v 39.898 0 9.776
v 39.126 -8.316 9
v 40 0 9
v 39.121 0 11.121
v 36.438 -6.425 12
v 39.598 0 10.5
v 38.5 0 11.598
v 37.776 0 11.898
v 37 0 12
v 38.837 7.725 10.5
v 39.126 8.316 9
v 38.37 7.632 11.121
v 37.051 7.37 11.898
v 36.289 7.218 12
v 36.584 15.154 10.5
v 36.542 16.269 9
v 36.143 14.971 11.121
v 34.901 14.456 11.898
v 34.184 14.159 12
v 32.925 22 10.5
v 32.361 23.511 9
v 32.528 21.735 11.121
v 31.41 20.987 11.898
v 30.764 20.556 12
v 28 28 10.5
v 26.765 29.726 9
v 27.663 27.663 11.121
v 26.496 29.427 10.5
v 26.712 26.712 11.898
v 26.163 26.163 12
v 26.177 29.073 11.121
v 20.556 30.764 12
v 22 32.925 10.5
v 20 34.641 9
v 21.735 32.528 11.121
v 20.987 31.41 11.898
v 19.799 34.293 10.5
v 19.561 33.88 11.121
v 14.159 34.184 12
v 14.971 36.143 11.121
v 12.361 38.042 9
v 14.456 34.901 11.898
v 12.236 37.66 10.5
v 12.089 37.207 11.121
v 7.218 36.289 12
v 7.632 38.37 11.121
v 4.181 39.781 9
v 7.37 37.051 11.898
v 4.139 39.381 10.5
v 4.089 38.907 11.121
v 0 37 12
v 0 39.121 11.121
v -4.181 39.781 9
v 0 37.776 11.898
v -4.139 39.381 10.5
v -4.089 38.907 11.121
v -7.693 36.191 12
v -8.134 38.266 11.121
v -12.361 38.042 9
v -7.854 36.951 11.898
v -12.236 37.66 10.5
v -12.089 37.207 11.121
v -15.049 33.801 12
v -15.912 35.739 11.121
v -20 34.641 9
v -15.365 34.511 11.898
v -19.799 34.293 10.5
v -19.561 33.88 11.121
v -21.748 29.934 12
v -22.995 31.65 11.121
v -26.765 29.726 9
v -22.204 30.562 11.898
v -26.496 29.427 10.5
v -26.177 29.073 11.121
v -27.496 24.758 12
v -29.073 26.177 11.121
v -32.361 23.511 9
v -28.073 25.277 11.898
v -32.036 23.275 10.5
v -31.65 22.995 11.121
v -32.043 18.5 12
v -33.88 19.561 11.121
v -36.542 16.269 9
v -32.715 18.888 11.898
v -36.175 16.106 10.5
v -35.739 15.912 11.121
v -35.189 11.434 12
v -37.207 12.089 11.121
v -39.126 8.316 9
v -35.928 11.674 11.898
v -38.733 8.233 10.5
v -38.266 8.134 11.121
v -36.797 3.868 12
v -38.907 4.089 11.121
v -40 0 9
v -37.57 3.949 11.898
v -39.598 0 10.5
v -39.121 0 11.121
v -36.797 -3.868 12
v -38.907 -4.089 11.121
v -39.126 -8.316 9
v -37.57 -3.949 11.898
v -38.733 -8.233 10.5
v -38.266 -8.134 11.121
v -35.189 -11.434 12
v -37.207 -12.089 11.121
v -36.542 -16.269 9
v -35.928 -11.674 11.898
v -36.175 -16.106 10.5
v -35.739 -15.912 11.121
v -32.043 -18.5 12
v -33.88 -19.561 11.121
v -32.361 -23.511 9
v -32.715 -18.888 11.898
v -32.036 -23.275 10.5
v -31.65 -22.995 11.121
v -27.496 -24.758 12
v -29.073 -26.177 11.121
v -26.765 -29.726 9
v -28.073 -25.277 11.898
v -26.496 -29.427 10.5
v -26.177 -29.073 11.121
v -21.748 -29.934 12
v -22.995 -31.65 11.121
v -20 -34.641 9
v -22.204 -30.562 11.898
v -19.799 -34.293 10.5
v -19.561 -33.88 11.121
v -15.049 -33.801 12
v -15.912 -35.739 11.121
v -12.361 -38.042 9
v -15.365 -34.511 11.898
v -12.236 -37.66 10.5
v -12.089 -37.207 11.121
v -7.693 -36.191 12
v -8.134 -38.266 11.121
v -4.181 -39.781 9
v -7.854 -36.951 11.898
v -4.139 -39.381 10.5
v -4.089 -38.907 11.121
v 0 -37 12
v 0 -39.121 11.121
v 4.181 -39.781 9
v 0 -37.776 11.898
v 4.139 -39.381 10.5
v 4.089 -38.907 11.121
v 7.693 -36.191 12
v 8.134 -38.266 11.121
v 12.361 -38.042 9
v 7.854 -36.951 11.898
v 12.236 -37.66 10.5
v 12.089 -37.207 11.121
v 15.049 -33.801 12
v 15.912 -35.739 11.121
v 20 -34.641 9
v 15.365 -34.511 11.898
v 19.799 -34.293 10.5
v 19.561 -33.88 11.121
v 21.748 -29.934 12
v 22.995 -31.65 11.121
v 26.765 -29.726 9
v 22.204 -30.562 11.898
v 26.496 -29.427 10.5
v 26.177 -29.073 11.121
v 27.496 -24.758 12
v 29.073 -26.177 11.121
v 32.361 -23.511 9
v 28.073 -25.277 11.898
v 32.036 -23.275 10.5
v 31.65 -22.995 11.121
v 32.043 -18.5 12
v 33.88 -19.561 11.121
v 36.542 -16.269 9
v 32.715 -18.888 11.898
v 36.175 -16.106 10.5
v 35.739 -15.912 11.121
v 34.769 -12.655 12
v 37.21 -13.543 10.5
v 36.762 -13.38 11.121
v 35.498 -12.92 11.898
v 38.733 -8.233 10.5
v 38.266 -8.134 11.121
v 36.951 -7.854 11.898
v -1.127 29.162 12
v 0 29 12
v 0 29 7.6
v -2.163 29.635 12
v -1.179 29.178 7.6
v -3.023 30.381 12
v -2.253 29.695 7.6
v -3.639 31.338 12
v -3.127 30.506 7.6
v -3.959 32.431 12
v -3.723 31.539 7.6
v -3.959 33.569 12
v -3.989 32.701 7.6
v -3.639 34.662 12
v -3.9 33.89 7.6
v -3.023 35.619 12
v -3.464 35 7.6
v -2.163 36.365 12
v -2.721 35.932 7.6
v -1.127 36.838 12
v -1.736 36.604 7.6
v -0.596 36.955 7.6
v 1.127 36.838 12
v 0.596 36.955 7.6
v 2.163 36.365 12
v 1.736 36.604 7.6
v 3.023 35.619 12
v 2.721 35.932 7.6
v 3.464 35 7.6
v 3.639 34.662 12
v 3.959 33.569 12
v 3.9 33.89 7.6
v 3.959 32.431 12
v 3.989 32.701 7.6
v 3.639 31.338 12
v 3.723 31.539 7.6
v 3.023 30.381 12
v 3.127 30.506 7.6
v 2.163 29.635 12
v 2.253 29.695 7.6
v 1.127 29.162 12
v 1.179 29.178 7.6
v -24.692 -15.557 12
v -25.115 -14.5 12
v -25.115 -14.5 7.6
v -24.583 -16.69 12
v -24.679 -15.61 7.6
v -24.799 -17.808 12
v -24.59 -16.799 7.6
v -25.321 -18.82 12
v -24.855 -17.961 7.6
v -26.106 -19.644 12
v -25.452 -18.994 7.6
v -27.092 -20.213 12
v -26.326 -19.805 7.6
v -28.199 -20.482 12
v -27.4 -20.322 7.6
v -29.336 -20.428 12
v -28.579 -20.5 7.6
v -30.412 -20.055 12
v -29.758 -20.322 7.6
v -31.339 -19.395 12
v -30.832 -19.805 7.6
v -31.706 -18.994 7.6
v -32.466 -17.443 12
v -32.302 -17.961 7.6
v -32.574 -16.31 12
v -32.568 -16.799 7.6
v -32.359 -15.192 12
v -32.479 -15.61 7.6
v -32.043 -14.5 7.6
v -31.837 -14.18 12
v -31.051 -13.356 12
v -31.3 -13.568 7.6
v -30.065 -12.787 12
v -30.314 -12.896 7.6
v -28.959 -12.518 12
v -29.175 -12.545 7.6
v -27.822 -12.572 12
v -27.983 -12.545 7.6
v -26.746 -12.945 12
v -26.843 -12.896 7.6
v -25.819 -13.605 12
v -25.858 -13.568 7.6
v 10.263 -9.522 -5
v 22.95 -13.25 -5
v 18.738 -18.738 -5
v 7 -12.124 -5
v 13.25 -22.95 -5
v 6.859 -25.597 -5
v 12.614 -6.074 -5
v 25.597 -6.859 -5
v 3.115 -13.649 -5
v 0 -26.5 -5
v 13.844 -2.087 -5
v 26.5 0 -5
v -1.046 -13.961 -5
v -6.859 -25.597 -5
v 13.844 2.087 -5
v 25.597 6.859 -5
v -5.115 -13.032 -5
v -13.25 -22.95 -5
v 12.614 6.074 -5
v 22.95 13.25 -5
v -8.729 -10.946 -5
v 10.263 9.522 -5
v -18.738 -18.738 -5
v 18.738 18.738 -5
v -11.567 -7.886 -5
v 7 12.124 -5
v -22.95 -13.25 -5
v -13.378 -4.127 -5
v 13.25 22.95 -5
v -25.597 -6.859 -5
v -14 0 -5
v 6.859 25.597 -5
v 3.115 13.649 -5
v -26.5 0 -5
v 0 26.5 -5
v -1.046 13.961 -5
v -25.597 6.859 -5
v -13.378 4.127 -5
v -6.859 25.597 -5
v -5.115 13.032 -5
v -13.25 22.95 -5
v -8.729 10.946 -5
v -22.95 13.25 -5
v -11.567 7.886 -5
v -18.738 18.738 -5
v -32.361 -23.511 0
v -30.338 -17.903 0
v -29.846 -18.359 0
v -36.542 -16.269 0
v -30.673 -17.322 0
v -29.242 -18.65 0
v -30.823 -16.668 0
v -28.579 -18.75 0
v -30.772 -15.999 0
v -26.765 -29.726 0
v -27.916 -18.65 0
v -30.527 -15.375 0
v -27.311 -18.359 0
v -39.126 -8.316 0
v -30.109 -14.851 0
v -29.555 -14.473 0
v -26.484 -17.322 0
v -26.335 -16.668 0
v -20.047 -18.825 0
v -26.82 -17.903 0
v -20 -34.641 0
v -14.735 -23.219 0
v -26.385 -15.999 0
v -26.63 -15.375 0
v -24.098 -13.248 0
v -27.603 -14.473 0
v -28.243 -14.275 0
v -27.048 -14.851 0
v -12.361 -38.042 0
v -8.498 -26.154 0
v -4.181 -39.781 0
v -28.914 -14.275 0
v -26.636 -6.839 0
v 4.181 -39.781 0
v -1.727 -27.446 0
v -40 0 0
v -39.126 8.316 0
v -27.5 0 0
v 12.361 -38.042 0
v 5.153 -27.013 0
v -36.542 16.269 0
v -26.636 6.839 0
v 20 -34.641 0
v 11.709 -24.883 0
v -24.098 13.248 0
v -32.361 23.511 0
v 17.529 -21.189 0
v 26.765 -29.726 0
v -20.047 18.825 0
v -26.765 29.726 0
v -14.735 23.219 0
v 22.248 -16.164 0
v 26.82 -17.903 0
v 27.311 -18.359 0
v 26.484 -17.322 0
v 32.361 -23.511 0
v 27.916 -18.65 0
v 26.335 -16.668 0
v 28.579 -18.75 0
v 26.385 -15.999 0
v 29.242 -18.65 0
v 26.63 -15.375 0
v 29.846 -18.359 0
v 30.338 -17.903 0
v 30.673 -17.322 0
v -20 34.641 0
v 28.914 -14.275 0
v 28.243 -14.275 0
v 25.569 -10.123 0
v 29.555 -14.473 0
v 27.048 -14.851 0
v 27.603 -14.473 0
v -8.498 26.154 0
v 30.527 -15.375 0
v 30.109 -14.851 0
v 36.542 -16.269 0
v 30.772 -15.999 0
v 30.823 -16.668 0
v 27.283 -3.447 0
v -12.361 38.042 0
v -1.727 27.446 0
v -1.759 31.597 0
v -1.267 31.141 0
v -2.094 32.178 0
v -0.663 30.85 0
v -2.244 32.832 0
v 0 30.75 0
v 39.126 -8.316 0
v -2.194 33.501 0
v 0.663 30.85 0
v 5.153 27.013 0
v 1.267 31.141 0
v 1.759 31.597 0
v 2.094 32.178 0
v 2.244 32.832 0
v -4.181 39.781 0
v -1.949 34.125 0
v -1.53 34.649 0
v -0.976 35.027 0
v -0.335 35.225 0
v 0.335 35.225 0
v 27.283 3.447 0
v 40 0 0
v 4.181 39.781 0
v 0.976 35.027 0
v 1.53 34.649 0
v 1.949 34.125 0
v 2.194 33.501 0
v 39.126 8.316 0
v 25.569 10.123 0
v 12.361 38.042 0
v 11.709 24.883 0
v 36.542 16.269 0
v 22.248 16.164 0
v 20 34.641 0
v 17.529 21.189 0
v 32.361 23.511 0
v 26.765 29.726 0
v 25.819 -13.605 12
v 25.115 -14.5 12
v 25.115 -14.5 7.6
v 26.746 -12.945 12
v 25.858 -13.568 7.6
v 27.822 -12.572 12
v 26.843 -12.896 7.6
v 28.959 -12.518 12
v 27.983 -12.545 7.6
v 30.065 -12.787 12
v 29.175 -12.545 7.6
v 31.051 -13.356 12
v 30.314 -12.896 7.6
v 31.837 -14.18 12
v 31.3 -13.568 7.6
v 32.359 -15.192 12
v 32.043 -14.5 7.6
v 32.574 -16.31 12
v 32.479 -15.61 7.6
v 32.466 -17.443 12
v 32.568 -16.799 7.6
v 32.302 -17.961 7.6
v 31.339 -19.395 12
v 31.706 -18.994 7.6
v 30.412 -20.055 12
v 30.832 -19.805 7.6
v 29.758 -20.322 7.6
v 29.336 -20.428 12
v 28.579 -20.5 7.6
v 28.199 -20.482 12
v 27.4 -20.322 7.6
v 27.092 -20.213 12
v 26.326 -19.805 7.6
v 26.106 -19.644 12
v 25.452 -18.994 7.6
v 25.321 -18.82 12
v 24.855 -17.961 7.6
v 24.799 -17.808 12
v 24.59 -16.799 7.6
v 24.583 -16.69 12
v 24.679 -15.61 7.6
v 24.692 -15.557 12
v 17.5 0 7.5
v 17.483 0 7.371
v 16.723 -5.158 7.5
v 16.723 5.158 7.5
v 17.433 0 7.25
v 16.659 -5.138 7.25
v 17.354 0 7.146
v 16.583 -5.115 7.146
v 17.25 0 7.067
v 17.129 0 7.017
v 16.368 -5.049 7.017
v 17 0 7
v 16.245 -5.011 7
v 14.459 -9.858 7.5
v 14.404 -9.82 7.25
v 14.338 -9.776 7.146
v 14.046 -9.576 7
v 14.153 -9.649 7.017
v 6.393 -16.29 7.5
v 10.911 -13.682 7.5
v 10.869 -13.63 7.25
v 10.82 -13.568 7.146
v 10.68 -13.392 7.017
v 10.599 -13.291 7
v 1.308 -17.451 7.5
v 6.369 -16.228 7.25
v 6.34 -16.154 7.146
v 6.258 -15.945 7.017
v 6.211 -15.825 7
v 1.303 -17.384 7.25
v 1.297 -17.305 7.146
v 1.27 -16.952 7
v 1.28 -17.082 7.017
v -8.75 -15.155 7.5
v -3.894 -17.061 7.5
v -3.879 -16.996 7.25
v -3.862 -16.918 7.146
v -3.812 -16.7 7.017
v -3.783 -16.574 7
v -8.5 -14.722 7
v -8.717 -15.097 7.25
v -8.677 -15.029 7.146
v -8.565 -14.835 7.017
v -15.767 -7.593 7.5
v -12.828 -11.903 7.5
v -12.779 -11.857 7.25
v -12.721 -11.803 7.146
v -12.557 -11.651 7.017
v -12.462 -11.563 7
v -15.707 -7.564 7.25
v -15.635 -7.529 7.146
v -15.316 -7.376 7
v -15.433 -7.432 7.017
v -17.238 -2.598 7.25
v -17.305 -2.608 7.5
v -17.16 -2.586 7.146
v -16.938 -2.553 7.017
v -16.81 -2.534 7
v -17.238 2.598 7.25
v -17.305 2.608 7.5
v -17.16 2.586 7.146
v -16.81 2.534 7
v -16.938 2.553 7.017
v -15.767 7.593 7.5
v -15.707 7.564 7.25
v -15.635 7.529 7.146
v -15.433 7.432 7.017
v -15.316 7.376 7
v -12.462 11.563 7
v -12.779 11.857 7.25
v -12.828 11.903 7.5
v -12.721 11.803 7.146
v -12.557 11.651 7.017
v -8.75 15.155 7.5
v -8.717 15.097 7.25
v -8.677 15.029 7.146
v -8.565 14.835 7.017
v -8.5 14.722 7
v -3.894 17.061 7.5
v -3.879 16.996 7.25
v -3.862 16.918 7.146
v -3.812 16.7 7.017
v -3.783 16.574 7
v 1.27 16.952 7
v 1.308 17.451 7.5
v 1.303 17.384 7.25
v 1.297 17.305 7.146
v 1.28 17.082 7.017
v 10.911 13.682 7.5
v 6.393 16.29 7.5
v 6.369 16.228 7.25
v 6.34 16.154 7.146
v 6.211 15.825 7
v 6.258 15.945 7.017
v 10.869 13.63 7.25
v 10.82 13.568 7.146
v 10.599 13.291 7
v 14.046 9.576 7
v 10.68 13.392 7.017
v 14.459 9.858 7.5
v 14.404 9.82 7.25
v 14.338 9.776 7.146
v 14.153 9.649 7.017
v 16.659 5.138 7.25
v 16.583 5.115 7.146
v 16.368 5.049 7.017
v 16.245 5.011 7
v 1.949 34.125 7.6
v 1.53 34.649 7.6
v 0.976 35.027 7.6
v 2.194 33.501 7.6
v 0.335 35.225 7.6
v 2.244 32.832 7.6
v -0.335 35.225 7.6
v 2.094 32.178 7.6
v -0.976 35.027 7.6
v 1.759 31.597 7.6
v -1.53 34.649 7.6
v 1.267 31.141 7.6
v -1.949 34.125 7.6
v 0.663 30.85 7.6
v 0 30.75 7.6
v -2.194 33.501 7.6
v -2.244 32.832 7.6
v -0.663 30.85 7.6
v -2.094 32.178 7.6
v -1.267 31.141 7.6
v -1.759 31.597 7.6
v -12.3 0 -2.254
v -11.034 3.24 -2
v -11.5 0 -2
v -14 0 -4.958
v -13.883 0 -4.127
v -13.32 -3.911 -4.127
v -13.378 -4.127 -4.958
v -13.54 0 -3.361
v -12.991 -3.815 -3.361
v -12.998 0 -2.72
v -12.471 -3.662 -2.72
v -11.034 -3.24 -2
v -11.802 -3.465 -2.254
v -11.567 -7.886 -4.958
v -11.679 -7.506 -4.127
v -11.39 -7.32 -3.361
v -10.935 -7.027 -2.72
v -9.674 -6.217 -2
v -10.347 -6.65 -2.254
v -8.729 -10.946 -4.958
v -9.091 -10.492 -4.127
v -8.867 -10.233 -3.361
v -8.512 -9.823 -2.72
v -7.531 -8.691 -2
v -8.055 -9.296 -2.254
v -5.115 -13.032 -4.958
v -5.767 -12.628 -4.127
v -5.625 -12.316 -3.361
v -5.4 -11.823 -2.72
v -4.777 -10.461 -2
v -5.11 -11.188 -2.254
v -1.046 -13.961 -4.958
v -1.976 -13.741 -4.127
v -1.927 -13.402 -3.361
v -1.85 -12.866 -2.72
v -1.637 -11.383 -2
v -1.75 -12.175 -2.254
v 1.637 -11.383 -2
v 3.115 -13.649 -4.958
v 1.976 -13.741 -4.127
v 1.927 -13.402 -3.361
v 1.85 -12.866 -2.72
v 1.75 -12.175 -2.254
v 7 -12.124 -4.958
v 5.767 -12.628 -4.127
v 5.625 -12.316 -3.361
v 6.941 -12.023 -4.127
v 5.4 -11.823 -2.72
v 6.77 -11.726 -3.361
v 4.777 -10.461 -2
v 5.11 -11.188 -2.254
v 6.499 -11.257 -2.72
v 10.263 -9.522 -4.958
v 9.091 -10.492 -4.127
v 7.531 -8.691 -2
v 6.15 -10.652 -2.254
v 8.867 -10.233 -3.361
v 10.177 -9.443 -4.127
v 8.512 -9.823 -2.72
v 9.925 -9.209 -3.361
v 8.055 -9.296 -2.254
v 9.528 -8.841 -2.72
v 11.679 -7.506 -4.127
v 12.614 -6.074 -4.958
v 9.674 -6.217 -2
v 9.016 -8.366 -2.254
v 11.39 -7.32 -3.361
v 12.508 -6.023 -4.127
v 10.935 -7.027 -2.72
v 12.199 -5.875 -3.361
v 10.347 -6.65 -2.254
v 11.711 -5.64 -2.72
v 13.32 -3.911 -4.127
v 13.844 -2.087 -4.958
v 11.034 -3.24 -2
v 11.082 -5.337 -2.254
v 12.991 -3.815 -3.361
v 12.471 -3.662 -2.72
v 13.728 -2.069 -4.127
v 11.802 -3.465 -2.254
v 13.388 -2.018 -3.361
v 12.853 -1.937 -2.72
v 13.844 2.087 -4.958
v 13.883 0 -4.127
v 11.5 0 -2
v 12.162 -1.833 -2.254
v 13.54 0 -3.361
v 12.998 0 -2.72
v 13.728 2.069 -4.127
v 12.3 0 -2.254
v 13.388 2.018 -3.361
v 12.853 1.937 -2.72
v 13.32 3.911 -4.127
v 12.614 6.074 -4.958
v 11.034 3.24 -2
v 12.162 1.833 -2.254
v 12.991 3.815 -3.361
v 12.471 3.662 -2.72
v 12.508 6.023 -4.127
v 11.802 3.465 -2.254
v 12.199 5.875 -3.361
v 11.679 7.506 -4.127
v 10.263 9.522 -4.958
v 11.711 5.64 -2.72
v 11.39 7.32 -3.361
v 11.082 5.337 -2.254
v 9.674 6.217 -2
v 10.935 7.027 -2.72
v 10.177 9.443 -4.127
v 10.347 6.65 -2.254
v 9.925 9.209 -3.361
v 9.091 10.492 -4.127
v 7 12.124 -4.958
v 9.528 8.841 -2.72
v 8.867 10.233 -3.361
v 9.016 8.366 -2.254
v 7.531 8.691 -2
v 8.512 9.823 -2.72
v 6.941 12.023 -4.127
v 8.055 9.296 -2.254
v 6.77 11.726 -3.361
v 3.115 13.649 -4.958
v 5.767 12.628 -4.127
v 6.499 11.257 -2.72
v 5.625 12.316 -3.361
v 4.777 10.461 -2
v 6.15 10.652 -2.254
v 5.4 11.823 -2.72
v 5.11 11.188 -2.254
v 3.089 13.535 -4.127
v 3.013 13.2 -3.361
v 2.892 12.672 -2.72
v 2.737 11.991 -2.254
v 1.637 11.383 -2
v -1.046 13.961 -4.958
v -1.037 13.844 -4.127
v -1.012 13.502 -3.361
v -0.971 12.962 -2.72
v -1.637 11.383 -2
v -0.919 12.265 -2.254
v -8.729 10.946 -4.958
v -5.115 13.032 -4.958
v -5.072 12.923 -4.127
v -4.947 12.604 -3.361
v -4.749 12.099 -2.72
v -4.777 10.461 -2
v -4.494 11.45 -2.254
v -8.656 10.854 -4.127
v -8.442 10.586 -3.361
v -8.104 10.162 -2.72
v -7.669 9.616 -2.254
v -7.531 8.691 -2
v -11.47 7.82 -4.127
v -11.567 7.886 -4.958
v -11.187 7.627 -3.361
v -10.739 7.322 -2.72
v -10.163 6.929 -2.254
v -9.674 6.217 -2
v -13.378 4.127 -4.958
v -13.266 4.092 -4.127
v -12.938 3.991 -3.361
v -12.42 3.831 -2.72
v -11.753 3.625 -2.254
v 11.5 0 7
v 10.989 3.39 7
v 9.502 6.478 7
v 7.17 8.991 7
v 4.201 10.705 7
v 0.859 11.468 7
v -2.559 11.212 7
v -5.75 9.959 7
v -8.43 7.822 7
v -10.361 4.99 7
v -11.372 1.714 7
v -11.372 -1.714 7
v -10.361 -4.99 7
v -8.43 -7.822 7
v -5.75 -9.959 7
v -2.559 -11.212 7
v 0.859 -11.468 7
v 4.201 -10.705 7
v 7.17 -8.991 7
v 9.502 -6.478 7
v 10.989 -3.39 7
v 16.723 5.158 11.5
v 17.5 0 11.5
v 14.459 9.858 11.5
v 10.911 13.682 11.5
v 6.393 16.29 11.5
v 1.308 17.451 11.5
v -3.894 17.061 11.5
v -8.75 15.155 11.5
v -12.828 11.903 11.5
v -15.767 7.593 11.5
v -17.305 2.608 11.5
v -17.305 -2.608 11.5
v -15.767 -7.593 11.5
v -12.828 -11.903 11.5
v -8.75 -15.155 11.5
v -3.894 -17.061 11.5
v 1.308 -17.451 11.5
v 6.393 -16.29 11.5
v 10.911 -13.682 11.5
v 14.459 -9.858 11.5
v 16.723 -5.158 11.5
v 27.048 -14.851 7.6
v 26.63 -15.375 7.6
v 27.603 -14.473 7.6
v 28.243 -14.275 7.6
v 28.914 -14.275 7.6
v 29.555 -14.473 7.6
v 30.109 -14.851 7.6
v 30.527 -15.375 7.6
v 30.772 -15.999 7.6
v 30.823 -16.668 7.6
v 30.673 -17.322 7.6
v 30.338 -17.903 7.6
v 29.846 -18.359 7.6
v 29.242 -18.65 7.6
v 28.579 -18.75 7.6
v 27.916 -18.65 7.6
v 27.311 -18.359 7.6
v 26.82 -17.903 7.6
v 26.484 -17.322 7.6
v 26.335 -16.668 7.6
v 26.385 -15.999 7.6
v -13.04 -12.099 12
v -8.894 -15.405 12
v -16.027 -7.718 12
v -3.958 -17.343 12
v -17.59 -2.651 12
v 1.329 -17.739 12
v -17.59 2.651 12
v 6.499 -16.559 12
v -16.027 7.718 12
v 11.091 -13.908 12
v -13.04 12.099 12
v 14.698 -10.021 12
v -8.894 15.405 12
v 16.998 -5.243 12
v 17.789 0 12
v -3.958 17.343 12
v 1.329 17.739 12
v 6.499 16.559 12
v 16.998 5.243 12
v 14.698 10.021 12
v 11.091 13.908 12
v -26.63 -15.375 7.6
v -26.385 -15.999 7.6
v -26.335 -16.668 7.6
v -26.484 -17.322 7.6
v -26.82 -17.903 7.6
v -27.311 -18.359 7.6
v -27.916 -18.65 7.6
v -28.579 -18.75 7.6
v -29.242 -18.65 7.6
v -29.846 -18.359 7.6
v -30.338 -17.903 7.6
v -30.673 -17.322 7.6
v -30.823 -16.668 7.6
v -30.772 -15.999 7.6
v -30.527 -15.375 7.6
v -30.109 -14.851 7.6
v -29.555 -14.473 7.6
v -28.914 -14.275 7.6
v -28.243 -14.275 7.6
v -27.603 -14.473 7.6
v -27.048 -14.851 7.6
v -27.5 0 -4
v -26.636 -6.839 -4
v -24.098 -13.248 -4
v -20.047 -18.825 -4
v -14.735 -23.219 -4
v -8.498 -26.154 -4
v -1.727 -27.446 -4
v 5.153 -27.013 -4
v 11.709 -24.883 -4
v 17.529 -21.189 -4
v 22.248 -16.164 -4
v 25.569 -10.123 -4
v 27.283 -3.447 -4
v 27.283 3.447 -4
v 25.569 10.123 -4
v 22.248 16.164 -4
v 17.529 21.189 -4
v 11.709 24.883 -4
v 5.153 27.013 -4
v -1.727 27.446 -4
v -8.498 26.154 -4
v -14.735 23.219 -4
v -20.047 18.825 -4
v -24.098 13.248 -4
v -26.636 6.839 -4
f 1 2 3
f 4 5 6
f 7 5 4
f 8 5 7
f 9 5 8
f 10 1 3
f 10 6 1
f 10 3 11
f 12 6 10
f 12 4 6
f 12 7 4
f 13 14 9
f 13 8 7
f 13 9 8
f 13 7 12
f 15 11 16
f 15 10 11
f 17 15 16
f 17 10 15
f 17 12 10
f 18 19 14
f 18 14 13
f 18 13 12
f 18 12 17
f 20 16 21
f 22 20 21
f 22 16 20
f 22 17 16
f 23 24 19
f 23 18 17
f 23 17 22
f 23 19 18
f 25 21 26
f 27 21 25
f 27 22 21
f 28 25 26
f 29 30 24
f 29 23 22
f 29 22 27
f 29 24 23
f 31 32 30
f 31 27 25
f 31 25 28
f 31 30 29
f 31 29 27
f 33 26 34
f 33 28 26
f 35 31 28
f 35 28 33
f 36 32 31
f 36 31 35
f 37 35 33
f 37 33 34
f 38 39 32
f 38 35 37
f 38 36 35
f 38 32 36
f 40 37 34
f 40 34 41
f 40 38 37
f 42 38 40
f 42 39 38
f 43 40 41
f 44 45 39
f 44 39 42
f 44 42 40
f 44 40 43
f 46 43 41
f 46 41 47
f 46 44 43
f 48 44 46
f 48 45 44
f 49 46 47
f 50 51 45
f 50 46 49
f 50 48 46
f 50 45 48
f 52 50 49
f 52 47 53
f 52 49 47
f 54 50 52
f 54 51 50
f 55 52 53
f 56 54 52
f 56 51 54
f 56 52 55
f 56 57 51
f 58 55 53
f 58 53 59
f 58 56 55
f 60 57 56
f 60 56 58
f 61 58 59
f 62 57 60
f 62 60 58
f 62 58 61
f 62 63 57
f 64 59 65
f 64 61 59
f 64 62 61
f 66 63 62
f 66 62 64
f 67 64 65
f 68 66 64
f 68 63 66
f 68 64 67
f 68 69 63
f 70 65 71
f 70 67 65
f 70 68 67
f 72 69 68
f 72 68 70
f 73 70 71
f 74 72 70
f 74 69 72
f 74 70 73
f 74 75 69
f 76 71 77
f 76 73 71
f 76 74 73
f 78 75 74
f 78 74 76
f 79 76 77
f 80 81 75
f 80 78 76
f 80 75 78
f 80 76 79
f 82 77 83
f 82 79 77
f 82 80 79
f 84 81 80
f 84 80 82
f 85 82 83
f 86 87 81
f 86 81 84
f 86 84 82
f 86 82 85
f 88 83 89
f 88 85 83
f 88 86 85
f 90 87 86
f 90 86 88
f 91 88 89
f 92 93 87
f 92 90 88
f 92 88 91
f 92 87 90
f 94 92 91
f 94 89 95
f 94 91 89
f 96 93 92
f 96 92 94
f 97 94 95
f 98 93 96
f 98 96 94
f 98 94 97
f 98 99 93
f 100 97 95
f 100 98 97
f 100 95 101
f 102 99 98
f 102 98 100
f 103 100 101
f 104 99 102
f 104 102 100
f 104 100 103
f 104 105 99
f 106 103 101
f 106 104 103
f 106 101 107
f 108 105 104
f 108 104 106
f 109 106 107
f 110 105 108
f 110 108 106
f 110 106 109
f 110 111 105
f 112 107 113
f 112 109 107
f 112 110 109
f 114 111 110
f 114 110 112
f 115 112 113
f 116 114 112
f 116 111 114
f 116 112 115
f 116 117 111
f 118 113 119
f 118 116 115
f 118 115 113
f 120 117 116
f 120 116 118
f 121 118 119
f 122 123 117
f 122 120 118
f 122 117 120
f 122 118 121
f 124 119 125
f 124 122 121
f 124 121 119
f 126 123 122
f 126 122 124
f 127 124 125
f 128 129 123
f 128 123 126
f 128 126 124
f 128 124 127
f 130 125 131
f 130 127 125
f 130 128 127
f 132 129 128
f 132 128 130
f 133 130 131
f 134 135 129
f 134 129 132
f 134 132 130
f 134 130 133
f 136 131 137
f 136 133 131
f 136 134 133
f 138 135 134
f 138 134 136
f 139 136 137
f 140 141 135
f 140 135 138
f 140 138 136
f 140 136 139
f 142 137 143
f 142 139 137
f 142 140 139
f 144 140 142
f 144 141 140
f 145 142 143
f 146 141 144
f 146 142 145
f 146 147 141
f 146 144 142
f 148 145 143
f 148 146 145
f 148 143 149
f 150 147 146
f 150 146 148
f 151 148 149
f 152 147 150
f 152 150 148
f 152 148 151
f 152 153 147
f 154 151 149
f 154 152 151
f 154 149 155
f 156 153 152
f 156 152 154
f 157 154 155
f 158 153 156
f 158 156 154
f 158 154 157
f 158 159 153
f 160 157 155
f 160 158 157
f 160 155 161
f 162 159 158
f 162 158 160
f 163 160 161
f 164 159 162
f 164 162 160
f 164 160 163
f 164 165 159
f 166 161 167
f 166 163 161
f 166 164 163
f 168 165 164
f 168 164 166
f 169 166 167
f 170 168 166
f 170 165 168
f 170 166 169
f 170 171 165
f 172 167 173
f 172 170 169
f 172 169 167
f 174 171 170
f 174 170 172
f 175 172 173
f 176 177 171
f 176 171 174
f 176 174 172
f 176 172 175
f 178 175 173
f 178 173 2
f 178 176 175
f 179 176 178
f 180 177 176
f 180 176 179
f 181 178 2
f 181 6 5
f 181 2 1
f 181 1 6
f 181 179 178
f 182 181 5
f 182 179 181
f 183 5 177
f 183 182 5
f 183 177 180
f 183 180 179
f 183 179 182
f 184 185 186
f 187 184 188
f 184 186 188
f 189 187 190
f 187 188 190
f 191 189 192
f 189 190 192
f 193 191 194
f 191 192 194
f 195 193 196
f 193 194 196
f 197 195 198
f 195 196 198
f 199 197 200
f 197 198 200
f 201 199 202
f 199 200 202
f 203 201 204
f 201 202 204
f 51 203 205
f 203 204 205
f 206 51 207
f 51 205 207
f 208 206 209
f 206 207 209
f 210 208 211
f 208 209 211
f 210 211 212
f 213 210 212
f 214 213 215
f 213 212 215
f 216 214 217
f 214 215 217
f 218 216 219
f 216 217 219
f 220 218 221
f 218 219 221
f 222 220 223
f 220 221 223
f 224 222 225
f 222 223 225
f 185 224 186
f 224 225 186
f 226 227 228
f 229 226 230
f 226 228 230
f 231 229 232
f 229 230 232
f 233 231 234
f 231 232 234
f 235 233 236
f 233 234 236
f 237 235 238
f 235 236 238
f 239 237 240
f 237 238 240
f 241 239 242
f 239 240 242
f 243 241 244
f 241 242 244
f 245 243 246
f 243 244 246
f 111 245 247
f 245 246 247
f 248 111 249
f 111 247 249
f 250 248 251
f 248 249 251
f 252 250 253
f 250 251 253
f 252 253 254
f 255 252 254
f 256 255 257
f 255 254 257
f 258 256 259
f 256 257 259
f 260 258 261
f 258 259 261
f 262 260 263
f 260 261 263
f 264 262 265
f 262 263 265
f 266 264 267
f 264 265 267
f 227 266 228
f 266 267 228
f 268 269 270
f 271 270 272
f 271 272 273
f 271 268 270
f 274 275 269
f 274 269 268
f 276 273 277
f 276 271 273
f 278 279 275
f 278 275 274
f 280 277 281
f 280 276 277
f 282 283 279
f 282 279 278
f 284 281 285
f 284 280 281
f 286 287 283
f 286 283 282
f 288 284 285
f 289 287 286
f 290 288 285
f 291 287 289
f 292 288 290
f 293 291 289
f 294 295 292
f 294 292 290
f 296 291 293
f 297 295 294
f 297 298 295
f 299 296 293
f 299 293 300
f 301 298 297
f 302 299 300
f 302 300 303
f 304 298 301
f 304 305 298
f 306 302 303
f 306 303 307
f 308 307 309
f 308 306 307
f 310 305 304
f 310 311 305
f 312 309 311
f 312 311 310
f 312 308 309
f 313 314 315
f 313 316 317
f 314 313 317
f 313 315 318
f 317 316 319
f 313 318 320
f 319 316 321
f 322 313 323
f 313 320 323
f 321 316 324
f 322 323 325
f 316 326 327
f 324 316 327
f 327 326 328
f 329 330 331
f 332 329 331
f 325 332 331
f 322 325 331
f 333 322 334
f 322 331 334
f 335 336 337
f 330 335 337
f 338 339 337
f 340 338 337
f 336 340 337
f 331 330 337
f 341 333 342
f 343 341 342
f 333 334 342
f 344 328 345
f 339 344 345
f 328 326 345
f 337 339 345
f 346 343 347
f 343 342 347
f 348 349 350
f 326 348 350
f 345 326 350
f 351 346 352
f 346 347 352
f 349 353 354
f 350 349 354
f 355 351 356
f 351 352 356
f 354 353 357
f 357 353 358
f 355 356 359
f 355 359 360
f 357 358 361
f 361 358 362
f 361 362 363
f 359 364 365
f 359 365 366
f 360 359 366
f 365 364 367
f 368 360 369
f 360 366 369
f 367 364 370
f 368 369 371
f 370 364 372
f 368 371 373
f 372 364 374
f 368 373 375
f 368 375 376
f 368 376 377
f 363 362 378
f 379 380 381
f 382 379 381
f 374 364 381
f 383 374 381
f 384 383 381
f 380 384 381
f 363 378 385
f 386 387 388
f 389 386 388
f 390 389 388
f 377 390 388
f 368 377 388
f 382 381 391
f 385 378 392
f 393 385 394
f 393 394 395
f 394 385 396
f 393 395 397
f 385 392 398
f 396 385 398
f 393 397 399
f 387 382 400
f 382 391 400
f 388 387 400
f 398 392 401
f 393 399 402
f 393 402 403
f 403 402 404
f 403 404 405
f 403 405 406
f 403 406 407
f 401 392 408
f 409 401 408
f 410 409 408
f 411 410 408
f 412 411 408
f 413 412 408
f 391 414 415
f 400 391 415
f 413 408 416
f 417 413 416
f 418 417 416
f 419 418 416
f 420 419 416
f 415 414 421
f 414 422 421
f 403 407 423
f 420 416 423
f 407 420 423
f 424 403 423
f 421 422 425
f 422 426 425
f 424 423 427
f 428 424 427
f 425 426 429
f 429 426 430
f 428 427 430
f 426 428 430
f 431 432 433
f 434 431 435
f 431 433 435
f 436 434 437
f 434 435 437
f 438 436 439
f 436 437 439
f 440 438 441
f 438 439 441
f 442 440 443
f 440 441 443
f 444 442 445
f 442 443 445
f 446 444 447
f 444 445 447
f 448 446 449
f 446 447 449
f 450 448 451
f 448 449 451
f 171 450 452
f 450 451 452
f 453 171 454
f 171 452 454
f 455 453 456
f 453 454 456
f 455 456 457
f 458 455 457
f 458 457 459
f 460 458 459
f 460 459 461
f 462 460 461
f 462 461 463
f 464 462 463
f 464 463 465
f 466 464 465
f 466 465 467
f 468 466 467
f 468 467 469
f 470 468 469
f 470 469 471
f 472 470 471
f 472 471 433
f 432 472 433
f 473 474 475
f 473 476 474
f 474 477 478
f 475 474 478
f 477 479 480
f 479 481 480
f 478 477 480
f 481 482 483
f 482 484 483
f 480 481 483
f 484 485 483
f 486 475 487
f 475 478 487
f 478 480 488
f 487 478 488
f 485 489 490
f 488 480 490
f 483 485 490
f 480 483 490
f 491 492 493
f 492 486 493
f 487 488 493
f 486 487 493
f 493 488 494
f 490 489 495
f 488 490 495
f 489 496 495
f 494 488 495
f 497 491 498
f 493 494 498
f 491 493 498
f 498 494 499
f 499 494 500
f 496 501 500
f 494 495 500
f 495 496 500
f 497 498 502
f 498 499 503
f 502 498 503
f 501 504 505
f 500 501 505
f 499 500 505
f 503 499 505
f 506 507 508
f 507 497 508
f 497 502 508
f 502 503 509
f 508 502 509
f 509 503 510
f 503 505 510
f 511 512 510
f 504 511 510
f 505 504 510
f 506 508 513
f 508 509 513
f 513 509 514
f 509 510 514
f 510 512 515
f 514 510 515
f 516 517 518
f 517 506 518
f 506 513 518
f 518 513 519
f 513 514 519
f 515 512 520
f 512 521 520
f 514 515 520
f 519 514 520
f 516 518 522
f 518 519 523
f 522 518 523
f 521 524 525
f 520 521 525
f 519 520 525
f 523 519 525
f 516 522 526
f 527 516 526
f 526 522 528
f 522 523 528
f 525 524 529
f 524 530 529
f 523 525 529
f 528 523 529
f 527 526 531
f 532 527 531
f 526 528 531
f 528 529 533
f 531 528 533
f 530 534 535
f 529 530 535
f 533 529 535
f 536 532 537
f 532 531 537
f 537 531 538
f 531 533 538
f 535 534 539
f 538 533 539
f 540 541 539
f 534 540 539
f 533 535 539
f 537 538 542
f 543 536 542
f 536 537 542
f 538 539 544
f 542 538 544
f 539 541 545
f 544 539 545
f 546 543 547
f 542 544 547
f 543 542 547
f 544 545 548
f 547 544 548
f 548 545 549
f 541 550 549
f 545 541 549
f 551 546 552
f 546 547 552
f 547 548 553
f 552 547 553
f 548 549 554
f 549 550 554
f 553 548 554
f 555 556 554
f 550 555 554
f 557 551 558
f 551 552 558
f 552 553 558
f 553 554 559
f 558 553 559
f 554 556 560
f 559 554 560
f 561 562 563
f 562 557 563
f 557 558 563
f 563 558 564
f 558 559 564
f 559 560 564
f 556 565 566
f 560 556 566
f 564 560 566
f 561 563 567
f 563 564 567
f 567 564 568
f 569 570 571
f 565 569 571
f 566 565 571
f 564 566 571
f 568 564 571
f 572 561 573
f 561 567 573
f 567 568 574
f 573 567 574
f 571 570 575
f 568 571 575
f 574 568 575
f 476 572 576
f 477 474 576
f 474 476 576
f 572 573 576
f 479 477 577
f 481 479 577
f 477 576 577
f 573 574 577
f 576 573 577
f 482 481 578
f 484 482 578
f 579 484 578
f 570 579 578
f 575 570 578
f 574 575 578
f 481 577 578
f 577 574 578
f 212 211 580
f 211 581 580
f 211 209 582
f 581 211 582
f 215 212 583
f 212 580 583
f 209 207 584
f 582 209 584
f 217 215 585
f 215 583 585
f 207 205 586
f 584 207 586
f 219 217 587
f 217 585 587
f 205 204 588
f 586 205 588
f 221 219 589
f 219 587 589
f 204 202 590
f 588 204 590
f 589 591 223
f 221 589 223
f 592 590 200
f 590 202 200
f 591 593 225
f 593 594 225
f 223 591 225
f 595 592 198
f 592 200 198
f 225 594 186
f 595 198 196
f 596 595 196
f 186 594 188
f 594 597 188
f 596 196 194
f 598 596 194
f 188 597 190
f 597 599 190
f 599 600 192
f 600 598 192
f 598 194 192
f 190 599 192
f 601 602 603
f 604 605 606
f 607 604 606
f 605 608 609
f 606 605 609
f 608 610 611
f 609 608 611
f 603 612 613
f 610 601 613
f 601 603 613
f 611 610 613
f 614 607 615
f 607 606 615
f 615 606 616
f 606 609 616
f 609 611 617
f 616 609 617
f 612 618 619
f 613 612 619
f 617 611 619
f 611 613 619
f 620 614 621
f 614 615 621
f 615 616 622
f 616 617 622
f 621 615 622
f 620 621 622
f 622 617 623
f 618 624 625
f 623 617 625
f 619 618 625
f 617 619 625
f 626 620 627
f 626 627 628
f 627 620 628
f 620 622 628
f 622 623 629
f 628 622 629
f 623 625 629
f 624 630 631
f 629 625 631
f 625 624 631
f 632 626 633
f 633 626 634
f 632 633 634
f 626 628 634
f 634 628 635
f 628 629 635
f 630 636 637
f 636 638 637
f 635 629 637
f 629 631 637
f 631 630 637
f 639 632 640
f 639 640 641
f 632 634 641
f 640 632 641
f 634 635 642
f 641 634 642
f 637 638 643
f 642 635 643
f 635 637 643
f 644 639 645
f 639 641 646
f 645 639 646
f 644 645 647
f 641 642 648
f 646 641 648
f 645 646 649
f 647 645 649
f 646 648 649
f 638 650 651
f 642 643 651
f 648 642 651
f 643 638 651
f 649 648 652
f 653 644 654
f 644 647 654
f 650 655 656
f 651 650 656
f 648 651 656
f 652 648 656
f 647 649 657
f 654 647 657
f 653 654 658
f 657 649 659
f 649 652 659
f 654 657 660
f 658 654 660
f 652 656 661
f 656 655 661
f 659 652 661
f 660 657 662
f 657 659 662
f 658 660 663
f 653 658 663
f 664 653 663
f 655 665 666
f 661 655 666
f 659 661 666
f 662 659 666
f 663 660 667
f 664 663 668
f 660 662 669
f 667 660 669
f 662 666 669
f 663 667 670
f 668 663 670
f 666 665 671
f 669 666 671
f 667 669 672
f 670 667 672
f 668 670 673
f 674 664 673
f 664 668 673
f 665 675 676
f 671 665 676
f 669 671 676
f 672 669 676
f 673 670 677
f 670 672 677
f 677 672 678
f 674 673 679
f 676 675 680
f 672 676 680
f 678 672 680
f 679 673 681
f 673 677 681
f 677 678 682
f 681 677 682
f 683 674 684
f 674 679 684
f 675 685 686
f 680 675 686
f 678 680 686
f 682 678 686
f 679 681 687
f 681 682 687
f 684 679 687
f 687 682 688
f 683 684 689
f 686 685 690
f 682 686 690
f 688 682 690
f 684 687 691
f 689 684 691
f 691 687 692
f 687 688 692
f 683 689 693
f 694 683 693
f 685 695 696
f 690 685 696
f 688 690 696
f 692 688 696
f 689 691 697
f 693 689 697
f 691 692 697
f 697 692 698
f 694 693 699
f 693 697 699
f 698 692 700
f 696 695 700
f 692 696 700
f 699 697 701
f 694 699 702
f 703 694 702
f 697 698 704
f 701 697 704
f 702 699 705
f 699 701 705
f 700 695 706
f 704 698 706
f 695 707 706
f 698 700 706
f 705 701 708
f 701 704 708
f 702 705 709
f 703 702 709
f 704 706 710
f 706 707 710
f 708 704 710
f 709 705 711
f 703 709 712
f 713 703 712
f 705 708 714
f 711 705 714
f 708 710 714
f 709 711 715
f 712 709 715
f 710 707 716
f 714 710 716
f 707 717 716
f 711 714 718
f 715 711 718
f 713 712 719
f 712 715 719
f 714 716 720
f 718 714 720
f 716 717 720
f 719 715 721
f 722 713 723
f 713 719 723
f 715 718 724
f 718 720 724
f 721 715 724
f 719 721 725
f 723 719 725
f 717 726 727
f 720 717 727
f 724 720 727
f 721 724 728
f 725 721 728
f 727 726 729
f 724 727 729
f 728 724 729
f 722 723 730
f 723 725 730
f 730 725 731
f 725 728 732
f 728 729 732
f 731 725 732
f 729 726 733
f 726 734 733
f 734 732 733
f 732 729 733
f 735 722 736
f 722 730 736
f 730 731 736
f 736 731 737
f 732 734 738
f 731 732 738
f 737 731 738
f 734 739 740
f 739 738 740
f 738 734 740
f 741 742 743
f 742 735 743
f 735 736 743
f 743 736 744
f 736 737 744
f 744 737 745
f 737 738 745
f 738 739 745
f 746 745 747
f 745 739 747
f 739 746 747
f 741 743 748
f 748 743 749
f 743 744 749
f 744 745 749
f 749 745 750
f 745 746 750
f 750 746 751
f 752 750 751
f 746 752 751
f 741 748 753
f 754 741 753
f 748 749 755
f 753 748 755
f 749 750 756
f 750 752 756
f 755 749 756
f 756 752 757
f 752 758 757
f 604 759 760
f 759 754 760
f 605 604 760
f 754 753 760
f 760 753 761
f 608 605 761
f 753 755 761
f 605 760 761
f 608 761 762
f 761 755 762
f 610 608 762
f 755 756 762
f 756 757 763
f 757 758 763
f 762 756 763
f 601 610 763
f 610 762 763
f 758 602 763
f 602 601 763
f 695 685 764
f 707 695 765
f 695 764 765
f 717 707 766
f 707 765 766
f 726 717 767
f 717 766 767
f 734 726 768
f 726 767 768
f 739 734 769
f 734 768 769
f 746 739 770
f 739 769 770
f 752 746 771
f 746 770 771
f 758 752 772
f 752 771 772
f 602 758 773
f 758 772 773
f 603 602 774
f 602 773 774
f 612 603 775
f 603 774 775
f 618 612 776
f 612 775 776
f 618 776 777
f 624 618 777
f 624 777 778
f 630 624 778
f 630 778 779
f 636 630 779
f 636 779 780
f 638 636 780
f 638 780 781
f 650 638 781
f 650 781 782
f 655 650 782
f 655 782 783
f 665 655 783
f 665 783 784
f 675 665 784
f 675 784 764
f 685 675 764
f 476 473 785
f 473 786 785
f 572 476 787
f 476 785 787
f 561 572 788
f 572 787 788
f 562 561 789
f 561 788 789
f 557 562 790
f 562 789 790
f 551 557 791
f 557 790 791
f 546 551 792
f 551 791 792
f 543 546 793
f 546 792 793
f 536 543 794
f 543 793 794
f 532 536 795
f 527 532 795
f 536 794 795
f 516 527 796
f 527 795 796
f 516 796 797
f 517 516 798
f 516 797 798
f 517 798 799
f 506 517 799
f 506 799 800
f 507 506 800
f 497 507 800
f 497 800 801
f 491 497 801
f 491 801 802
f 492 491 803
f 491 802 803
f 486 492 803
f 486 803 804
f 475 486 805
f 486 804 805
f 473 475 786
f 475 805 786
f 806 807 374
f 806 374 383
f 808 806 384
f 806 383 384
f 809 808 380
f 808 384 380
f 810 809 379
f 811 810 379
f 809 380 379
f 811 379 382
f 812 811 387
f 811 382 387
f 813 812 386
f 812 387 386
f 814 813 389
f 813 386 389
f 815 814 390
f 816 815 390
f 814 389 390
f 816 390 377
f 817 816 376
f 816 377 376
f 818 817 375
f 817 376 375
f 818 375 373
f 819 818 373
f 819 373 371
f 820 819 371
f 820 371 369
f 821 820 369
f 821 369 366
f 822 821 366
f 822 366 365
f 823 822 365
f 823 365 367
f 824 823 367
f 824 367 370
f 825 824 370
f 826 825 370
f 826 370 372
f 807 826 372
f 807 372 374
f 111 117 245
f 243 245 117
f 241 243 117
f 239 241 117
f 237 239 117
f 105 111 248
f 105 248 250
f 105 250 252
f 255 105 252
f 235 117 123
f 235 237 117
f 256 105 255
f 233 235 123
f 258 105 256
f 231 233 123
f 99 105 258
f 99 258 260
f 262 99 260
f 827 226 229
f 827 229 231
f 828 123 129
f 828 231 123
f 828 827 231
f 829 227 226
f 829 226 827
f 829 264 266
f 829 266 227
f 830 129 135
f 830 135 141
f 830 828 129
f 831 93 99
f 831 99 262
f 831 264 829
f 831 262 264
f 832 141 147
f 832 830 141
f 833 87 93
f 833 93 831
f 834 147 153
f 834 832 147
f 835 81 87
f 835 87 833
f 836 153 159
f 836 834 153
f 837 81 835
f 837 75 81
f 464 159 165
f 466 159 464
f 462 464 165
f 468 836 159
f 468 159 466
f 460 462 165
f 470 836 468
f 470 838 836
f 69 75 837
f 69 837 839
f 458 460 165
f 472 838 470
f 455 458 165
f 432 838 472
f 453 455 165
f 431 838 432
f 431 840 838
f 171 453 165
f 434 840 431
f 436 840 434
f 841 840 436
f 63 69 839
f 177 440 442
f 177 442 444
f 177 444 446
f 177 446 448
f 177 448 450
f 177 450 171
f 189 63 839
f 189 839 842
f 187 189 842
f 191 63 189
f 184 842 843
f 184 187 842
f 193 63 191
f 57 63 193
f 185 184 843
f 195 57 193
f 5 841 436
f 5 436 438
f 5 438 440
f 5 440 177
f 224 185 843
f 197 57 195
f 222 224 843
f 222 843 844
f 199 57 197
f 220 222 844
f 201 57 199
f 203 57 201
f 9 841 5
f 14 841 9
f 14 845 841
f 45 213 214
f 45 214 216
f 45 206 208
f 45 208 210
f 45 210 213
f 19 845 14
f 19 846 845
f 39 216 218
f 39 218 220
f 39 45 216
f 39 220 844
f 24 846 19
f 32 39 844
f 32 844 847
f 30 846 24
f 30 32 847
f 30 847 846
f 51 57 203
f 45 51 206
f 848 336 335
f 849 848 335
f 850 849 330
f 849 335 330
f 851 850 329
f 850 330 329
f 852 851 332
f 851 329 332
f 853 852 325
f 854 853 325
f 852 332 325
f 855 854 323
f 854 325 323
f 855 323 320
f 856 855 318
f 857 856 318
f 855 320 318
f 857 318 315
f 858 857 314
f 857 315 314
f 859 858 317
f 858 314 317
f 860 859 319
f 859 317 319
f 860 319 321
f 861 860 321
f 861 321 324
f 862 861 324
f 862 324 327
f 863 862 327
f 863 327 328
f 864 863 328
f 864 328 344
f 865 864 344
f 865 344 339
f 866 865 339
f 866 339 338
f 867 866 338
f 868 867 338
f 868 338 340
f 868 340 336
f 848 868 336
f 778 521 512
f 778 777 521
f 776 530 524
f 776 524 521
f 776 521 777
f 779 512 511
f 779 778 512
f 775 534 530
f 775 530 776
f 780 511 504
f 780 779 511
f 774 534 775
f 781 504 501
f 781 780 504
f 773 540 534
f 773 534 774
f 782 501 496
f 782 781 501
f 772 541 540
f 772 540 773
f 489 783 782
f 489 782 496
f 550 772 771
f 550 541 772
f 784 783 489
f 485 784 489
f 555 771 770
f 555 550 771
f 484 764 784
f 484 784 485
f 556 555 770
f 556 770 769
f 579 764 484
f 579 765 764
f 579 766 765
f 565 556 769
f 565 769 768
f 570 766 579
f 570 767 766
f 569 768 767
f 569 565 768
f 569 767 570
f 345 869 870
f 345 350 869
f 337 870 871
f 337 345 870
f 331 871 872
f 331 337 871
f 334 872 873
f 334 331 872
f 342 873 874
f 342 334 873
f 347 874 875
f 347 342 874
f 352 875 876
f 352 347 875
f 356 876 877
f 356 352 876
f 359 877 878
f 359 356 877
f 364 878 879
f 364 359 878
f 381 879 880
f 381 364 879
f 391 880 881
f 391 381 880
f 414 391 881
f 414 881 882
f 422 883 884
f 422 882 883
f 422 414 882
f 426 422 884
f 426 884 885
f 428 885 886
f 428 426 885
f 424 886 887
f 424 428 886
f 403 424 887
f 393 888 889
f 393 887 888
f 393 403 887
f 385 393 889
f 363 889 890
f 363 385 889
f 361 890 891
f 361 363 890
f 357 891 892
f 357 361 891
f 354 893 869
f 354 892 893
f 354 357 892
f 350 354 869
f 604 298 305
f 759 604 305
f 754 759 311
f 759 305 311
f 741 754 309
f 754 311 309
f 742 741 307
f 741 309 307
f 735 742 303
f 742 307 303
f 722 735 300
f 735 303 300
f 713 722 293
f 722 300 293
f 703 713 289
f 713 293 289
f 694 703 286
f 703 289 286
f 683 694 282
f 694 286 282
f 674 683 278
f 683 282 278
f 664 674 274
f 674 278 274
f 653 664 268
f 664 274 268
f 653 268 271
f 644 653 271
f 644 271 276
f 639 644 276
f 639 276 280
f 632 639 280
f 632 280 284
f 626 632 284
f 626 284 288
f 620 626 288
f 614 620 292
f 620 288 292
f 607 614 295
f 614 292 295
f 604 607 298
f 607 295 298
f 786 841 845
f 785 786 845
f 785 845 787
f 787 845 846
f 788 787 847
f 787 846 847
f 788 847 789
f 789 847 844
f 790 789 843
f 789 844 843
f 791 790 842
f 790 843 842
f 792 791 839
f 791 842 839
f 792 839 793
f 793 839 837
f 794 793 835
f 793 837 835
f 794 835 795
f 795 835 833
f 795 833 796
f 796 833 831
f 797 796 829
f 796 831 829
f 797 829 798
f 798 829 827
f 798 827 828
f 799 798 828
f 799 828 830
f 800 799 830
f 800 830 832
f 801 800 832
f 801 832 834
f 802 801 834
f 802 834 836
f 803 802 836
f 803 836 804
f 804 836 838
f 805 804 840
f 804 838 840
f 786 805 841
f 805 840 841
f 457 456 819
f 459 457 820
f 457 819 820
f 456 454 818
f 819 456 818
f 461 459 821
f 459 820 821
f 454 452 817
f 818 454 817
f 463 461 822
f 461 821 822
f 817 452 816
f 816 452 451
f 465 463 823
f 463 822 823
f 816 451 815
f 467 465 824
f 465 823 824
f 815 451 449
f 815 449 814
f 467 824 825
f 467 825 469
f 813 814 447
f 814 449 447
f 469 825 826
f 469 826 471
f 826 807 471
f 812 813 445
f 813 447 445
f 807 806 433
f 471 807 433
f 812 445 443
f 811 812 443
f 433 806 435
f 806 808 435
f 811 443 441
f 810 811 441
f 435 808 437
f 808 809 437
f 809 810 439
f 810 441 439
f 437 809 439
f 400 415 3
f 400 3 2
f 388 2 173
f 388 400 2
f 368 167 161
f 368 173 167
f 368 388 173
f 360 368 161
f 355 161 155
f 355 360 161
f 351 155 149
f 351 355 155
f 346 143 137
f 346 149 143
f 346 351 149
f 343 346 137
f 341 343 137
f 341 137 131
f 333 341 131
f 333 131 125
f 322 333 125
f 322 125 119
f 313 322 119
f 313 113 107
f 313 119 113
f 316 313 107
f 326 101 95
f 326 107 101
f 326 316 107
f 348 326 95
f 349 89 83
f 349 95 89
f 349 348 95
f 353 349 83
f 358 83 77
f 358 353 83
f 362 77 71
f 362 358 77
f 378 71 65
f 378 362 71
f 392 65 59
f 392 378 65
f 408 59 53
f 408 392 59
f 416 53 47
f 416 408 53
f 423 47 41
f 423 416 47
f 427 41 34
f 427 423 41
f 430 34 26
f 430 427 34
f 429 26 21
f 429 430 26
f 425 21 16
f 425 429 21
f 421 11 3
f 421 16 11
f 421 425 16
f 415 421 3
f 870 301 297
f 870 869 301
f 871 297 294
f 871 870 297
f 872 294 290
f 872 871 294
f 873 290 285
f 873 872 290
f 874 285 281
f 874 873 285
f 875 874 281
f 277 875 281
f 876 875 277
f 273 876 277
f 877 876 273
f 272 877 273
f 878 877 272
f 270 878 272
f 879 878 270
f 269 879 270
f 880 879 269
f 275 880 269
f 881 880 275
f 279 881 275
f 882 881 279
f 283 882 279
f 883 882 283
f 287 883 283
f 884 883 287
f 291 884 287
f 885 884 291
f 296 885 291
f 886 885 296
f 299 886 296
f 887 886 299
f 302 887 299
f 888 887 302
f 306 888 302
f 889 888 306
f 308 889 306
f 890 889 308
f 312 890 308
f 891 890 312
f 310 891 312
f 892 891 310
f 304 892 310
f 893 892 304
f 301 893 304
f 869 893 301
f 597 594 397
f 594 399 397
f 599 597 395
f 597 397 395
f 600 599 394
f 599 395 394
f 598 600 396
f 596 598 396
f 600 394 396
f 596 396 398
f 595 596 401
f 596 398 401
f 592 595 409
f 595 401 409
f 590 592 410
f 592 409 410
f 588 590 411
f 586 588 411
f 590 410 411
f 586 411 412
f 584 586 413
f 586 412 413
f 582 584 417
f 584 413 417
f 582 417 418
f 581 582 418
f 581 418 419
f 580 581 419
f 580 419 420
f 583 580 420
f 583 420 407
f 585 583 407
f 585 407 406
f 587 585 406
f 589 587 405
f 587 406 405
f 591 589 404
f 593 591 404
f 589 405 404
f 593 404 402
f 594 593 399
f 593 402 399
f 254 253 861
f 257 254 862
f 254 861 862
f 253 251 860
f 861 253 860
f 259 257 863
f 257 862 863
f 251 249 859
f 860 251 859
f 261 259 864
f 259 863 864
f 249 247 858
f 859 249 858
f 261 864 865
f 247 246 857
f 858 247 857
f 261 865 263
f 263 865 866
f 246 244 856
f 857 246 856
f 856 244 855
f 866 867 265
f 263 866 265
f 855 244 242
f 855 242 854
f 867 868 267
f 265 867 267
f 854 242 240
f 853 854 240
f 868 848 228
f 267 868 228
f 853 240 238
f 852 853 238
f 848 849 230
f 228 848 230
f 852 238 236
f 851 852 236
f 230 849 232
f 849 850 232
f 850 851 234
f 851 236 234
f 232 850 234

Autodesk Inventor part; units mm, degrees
ref_plane "YZ Plane" through (0, 0, 0) normal (1, 0, 0) x (0, 1, 0)
ref_plane "XZ Plane" through (0, 0, 0) normal (0, 1, 0) x (-1, 0, 0)
ref_plane "XY Plane" through (0, 0, 0) normal (0, 0, 1) x (1, 0, 0)
sketch "스케치4" plane through (0, 0, 0) normal (0, 0, 1) x (1, 0, 0)
  circle A0 centre (0, 0) radius 40
  dimension "d28" = 80
extrude "돌출4" add sketch "스케치4" along normal blind 12
sketch "스케치6" plane through (0, 0, 0) normal (0, 0, -1) x (-1, 0, 0)
  circle A0 centre (0, 0) radius 27.5
  dimension "d34" = 55
extrude "돌출6" add sketch "스케치6" along normal blind 5
sketch "스케치9" plane through (0, 0, -5) normal (0, 0, -1) x (-1, 0, 0)
  circle A0 centre (0, 0) radius 14
  dimension "d44" = 28
extrude "돌출9" cut sketch "스케치9" against normal blind 3
sketch "스케치12" plane through (0, 0, 12) normal (0, 0, 1) x (1, 0, 0)
  circle A0 centre (0, 33) radius 3
  point P0 (0, 0)
  dimension "d61" = 6
  dimension "d62" = 33
hole "구멍1" at (0, 33, 12) direction (0, 0, -1) diameter 4.5 end through all counterbore diameter 8 counterbore depth 4.4
sketch "스케치13" plane through (0, 0, 12) normal (0, 0, 1) x (1, 0, 0)
  circle A0 centre (0, 0) radius 17.5
  dimension "d74" = 35
extrude "돌출11" cut sketch "스케치13" against normal blind 5
sketch "스케치14" plane through (0, 0, 7) normal (0, 0, 1) x (1, 0, 0)
  circle A0 centre (0, 0) radius 11.5
  dimension "d77" = 23
extrude "돌출12" cut sketch "스케치14" against normal up to next
pattern_circular "원형 패턴3" count 3 over 360 about axis through (0, 0, 7) along (0, 0, -1) of "구멍1"
fillet "모깎기3" radius 3 2 edges at (-40, 0, 12) (14, 0, -2)
chamfer "모따기5" distance 1 angle 45 1 edges at (27.5, 0, -5)
fillet "모깎기4" radius 0.5 1 edges at (-17.5, 0, 7)
chamfer "모따기6" distance 0.5 angle 30 1 edges at (-17.5, 0, 12) measured on face at (17.4433, -1.4082, 9)
properties part number "도면3-2번"
